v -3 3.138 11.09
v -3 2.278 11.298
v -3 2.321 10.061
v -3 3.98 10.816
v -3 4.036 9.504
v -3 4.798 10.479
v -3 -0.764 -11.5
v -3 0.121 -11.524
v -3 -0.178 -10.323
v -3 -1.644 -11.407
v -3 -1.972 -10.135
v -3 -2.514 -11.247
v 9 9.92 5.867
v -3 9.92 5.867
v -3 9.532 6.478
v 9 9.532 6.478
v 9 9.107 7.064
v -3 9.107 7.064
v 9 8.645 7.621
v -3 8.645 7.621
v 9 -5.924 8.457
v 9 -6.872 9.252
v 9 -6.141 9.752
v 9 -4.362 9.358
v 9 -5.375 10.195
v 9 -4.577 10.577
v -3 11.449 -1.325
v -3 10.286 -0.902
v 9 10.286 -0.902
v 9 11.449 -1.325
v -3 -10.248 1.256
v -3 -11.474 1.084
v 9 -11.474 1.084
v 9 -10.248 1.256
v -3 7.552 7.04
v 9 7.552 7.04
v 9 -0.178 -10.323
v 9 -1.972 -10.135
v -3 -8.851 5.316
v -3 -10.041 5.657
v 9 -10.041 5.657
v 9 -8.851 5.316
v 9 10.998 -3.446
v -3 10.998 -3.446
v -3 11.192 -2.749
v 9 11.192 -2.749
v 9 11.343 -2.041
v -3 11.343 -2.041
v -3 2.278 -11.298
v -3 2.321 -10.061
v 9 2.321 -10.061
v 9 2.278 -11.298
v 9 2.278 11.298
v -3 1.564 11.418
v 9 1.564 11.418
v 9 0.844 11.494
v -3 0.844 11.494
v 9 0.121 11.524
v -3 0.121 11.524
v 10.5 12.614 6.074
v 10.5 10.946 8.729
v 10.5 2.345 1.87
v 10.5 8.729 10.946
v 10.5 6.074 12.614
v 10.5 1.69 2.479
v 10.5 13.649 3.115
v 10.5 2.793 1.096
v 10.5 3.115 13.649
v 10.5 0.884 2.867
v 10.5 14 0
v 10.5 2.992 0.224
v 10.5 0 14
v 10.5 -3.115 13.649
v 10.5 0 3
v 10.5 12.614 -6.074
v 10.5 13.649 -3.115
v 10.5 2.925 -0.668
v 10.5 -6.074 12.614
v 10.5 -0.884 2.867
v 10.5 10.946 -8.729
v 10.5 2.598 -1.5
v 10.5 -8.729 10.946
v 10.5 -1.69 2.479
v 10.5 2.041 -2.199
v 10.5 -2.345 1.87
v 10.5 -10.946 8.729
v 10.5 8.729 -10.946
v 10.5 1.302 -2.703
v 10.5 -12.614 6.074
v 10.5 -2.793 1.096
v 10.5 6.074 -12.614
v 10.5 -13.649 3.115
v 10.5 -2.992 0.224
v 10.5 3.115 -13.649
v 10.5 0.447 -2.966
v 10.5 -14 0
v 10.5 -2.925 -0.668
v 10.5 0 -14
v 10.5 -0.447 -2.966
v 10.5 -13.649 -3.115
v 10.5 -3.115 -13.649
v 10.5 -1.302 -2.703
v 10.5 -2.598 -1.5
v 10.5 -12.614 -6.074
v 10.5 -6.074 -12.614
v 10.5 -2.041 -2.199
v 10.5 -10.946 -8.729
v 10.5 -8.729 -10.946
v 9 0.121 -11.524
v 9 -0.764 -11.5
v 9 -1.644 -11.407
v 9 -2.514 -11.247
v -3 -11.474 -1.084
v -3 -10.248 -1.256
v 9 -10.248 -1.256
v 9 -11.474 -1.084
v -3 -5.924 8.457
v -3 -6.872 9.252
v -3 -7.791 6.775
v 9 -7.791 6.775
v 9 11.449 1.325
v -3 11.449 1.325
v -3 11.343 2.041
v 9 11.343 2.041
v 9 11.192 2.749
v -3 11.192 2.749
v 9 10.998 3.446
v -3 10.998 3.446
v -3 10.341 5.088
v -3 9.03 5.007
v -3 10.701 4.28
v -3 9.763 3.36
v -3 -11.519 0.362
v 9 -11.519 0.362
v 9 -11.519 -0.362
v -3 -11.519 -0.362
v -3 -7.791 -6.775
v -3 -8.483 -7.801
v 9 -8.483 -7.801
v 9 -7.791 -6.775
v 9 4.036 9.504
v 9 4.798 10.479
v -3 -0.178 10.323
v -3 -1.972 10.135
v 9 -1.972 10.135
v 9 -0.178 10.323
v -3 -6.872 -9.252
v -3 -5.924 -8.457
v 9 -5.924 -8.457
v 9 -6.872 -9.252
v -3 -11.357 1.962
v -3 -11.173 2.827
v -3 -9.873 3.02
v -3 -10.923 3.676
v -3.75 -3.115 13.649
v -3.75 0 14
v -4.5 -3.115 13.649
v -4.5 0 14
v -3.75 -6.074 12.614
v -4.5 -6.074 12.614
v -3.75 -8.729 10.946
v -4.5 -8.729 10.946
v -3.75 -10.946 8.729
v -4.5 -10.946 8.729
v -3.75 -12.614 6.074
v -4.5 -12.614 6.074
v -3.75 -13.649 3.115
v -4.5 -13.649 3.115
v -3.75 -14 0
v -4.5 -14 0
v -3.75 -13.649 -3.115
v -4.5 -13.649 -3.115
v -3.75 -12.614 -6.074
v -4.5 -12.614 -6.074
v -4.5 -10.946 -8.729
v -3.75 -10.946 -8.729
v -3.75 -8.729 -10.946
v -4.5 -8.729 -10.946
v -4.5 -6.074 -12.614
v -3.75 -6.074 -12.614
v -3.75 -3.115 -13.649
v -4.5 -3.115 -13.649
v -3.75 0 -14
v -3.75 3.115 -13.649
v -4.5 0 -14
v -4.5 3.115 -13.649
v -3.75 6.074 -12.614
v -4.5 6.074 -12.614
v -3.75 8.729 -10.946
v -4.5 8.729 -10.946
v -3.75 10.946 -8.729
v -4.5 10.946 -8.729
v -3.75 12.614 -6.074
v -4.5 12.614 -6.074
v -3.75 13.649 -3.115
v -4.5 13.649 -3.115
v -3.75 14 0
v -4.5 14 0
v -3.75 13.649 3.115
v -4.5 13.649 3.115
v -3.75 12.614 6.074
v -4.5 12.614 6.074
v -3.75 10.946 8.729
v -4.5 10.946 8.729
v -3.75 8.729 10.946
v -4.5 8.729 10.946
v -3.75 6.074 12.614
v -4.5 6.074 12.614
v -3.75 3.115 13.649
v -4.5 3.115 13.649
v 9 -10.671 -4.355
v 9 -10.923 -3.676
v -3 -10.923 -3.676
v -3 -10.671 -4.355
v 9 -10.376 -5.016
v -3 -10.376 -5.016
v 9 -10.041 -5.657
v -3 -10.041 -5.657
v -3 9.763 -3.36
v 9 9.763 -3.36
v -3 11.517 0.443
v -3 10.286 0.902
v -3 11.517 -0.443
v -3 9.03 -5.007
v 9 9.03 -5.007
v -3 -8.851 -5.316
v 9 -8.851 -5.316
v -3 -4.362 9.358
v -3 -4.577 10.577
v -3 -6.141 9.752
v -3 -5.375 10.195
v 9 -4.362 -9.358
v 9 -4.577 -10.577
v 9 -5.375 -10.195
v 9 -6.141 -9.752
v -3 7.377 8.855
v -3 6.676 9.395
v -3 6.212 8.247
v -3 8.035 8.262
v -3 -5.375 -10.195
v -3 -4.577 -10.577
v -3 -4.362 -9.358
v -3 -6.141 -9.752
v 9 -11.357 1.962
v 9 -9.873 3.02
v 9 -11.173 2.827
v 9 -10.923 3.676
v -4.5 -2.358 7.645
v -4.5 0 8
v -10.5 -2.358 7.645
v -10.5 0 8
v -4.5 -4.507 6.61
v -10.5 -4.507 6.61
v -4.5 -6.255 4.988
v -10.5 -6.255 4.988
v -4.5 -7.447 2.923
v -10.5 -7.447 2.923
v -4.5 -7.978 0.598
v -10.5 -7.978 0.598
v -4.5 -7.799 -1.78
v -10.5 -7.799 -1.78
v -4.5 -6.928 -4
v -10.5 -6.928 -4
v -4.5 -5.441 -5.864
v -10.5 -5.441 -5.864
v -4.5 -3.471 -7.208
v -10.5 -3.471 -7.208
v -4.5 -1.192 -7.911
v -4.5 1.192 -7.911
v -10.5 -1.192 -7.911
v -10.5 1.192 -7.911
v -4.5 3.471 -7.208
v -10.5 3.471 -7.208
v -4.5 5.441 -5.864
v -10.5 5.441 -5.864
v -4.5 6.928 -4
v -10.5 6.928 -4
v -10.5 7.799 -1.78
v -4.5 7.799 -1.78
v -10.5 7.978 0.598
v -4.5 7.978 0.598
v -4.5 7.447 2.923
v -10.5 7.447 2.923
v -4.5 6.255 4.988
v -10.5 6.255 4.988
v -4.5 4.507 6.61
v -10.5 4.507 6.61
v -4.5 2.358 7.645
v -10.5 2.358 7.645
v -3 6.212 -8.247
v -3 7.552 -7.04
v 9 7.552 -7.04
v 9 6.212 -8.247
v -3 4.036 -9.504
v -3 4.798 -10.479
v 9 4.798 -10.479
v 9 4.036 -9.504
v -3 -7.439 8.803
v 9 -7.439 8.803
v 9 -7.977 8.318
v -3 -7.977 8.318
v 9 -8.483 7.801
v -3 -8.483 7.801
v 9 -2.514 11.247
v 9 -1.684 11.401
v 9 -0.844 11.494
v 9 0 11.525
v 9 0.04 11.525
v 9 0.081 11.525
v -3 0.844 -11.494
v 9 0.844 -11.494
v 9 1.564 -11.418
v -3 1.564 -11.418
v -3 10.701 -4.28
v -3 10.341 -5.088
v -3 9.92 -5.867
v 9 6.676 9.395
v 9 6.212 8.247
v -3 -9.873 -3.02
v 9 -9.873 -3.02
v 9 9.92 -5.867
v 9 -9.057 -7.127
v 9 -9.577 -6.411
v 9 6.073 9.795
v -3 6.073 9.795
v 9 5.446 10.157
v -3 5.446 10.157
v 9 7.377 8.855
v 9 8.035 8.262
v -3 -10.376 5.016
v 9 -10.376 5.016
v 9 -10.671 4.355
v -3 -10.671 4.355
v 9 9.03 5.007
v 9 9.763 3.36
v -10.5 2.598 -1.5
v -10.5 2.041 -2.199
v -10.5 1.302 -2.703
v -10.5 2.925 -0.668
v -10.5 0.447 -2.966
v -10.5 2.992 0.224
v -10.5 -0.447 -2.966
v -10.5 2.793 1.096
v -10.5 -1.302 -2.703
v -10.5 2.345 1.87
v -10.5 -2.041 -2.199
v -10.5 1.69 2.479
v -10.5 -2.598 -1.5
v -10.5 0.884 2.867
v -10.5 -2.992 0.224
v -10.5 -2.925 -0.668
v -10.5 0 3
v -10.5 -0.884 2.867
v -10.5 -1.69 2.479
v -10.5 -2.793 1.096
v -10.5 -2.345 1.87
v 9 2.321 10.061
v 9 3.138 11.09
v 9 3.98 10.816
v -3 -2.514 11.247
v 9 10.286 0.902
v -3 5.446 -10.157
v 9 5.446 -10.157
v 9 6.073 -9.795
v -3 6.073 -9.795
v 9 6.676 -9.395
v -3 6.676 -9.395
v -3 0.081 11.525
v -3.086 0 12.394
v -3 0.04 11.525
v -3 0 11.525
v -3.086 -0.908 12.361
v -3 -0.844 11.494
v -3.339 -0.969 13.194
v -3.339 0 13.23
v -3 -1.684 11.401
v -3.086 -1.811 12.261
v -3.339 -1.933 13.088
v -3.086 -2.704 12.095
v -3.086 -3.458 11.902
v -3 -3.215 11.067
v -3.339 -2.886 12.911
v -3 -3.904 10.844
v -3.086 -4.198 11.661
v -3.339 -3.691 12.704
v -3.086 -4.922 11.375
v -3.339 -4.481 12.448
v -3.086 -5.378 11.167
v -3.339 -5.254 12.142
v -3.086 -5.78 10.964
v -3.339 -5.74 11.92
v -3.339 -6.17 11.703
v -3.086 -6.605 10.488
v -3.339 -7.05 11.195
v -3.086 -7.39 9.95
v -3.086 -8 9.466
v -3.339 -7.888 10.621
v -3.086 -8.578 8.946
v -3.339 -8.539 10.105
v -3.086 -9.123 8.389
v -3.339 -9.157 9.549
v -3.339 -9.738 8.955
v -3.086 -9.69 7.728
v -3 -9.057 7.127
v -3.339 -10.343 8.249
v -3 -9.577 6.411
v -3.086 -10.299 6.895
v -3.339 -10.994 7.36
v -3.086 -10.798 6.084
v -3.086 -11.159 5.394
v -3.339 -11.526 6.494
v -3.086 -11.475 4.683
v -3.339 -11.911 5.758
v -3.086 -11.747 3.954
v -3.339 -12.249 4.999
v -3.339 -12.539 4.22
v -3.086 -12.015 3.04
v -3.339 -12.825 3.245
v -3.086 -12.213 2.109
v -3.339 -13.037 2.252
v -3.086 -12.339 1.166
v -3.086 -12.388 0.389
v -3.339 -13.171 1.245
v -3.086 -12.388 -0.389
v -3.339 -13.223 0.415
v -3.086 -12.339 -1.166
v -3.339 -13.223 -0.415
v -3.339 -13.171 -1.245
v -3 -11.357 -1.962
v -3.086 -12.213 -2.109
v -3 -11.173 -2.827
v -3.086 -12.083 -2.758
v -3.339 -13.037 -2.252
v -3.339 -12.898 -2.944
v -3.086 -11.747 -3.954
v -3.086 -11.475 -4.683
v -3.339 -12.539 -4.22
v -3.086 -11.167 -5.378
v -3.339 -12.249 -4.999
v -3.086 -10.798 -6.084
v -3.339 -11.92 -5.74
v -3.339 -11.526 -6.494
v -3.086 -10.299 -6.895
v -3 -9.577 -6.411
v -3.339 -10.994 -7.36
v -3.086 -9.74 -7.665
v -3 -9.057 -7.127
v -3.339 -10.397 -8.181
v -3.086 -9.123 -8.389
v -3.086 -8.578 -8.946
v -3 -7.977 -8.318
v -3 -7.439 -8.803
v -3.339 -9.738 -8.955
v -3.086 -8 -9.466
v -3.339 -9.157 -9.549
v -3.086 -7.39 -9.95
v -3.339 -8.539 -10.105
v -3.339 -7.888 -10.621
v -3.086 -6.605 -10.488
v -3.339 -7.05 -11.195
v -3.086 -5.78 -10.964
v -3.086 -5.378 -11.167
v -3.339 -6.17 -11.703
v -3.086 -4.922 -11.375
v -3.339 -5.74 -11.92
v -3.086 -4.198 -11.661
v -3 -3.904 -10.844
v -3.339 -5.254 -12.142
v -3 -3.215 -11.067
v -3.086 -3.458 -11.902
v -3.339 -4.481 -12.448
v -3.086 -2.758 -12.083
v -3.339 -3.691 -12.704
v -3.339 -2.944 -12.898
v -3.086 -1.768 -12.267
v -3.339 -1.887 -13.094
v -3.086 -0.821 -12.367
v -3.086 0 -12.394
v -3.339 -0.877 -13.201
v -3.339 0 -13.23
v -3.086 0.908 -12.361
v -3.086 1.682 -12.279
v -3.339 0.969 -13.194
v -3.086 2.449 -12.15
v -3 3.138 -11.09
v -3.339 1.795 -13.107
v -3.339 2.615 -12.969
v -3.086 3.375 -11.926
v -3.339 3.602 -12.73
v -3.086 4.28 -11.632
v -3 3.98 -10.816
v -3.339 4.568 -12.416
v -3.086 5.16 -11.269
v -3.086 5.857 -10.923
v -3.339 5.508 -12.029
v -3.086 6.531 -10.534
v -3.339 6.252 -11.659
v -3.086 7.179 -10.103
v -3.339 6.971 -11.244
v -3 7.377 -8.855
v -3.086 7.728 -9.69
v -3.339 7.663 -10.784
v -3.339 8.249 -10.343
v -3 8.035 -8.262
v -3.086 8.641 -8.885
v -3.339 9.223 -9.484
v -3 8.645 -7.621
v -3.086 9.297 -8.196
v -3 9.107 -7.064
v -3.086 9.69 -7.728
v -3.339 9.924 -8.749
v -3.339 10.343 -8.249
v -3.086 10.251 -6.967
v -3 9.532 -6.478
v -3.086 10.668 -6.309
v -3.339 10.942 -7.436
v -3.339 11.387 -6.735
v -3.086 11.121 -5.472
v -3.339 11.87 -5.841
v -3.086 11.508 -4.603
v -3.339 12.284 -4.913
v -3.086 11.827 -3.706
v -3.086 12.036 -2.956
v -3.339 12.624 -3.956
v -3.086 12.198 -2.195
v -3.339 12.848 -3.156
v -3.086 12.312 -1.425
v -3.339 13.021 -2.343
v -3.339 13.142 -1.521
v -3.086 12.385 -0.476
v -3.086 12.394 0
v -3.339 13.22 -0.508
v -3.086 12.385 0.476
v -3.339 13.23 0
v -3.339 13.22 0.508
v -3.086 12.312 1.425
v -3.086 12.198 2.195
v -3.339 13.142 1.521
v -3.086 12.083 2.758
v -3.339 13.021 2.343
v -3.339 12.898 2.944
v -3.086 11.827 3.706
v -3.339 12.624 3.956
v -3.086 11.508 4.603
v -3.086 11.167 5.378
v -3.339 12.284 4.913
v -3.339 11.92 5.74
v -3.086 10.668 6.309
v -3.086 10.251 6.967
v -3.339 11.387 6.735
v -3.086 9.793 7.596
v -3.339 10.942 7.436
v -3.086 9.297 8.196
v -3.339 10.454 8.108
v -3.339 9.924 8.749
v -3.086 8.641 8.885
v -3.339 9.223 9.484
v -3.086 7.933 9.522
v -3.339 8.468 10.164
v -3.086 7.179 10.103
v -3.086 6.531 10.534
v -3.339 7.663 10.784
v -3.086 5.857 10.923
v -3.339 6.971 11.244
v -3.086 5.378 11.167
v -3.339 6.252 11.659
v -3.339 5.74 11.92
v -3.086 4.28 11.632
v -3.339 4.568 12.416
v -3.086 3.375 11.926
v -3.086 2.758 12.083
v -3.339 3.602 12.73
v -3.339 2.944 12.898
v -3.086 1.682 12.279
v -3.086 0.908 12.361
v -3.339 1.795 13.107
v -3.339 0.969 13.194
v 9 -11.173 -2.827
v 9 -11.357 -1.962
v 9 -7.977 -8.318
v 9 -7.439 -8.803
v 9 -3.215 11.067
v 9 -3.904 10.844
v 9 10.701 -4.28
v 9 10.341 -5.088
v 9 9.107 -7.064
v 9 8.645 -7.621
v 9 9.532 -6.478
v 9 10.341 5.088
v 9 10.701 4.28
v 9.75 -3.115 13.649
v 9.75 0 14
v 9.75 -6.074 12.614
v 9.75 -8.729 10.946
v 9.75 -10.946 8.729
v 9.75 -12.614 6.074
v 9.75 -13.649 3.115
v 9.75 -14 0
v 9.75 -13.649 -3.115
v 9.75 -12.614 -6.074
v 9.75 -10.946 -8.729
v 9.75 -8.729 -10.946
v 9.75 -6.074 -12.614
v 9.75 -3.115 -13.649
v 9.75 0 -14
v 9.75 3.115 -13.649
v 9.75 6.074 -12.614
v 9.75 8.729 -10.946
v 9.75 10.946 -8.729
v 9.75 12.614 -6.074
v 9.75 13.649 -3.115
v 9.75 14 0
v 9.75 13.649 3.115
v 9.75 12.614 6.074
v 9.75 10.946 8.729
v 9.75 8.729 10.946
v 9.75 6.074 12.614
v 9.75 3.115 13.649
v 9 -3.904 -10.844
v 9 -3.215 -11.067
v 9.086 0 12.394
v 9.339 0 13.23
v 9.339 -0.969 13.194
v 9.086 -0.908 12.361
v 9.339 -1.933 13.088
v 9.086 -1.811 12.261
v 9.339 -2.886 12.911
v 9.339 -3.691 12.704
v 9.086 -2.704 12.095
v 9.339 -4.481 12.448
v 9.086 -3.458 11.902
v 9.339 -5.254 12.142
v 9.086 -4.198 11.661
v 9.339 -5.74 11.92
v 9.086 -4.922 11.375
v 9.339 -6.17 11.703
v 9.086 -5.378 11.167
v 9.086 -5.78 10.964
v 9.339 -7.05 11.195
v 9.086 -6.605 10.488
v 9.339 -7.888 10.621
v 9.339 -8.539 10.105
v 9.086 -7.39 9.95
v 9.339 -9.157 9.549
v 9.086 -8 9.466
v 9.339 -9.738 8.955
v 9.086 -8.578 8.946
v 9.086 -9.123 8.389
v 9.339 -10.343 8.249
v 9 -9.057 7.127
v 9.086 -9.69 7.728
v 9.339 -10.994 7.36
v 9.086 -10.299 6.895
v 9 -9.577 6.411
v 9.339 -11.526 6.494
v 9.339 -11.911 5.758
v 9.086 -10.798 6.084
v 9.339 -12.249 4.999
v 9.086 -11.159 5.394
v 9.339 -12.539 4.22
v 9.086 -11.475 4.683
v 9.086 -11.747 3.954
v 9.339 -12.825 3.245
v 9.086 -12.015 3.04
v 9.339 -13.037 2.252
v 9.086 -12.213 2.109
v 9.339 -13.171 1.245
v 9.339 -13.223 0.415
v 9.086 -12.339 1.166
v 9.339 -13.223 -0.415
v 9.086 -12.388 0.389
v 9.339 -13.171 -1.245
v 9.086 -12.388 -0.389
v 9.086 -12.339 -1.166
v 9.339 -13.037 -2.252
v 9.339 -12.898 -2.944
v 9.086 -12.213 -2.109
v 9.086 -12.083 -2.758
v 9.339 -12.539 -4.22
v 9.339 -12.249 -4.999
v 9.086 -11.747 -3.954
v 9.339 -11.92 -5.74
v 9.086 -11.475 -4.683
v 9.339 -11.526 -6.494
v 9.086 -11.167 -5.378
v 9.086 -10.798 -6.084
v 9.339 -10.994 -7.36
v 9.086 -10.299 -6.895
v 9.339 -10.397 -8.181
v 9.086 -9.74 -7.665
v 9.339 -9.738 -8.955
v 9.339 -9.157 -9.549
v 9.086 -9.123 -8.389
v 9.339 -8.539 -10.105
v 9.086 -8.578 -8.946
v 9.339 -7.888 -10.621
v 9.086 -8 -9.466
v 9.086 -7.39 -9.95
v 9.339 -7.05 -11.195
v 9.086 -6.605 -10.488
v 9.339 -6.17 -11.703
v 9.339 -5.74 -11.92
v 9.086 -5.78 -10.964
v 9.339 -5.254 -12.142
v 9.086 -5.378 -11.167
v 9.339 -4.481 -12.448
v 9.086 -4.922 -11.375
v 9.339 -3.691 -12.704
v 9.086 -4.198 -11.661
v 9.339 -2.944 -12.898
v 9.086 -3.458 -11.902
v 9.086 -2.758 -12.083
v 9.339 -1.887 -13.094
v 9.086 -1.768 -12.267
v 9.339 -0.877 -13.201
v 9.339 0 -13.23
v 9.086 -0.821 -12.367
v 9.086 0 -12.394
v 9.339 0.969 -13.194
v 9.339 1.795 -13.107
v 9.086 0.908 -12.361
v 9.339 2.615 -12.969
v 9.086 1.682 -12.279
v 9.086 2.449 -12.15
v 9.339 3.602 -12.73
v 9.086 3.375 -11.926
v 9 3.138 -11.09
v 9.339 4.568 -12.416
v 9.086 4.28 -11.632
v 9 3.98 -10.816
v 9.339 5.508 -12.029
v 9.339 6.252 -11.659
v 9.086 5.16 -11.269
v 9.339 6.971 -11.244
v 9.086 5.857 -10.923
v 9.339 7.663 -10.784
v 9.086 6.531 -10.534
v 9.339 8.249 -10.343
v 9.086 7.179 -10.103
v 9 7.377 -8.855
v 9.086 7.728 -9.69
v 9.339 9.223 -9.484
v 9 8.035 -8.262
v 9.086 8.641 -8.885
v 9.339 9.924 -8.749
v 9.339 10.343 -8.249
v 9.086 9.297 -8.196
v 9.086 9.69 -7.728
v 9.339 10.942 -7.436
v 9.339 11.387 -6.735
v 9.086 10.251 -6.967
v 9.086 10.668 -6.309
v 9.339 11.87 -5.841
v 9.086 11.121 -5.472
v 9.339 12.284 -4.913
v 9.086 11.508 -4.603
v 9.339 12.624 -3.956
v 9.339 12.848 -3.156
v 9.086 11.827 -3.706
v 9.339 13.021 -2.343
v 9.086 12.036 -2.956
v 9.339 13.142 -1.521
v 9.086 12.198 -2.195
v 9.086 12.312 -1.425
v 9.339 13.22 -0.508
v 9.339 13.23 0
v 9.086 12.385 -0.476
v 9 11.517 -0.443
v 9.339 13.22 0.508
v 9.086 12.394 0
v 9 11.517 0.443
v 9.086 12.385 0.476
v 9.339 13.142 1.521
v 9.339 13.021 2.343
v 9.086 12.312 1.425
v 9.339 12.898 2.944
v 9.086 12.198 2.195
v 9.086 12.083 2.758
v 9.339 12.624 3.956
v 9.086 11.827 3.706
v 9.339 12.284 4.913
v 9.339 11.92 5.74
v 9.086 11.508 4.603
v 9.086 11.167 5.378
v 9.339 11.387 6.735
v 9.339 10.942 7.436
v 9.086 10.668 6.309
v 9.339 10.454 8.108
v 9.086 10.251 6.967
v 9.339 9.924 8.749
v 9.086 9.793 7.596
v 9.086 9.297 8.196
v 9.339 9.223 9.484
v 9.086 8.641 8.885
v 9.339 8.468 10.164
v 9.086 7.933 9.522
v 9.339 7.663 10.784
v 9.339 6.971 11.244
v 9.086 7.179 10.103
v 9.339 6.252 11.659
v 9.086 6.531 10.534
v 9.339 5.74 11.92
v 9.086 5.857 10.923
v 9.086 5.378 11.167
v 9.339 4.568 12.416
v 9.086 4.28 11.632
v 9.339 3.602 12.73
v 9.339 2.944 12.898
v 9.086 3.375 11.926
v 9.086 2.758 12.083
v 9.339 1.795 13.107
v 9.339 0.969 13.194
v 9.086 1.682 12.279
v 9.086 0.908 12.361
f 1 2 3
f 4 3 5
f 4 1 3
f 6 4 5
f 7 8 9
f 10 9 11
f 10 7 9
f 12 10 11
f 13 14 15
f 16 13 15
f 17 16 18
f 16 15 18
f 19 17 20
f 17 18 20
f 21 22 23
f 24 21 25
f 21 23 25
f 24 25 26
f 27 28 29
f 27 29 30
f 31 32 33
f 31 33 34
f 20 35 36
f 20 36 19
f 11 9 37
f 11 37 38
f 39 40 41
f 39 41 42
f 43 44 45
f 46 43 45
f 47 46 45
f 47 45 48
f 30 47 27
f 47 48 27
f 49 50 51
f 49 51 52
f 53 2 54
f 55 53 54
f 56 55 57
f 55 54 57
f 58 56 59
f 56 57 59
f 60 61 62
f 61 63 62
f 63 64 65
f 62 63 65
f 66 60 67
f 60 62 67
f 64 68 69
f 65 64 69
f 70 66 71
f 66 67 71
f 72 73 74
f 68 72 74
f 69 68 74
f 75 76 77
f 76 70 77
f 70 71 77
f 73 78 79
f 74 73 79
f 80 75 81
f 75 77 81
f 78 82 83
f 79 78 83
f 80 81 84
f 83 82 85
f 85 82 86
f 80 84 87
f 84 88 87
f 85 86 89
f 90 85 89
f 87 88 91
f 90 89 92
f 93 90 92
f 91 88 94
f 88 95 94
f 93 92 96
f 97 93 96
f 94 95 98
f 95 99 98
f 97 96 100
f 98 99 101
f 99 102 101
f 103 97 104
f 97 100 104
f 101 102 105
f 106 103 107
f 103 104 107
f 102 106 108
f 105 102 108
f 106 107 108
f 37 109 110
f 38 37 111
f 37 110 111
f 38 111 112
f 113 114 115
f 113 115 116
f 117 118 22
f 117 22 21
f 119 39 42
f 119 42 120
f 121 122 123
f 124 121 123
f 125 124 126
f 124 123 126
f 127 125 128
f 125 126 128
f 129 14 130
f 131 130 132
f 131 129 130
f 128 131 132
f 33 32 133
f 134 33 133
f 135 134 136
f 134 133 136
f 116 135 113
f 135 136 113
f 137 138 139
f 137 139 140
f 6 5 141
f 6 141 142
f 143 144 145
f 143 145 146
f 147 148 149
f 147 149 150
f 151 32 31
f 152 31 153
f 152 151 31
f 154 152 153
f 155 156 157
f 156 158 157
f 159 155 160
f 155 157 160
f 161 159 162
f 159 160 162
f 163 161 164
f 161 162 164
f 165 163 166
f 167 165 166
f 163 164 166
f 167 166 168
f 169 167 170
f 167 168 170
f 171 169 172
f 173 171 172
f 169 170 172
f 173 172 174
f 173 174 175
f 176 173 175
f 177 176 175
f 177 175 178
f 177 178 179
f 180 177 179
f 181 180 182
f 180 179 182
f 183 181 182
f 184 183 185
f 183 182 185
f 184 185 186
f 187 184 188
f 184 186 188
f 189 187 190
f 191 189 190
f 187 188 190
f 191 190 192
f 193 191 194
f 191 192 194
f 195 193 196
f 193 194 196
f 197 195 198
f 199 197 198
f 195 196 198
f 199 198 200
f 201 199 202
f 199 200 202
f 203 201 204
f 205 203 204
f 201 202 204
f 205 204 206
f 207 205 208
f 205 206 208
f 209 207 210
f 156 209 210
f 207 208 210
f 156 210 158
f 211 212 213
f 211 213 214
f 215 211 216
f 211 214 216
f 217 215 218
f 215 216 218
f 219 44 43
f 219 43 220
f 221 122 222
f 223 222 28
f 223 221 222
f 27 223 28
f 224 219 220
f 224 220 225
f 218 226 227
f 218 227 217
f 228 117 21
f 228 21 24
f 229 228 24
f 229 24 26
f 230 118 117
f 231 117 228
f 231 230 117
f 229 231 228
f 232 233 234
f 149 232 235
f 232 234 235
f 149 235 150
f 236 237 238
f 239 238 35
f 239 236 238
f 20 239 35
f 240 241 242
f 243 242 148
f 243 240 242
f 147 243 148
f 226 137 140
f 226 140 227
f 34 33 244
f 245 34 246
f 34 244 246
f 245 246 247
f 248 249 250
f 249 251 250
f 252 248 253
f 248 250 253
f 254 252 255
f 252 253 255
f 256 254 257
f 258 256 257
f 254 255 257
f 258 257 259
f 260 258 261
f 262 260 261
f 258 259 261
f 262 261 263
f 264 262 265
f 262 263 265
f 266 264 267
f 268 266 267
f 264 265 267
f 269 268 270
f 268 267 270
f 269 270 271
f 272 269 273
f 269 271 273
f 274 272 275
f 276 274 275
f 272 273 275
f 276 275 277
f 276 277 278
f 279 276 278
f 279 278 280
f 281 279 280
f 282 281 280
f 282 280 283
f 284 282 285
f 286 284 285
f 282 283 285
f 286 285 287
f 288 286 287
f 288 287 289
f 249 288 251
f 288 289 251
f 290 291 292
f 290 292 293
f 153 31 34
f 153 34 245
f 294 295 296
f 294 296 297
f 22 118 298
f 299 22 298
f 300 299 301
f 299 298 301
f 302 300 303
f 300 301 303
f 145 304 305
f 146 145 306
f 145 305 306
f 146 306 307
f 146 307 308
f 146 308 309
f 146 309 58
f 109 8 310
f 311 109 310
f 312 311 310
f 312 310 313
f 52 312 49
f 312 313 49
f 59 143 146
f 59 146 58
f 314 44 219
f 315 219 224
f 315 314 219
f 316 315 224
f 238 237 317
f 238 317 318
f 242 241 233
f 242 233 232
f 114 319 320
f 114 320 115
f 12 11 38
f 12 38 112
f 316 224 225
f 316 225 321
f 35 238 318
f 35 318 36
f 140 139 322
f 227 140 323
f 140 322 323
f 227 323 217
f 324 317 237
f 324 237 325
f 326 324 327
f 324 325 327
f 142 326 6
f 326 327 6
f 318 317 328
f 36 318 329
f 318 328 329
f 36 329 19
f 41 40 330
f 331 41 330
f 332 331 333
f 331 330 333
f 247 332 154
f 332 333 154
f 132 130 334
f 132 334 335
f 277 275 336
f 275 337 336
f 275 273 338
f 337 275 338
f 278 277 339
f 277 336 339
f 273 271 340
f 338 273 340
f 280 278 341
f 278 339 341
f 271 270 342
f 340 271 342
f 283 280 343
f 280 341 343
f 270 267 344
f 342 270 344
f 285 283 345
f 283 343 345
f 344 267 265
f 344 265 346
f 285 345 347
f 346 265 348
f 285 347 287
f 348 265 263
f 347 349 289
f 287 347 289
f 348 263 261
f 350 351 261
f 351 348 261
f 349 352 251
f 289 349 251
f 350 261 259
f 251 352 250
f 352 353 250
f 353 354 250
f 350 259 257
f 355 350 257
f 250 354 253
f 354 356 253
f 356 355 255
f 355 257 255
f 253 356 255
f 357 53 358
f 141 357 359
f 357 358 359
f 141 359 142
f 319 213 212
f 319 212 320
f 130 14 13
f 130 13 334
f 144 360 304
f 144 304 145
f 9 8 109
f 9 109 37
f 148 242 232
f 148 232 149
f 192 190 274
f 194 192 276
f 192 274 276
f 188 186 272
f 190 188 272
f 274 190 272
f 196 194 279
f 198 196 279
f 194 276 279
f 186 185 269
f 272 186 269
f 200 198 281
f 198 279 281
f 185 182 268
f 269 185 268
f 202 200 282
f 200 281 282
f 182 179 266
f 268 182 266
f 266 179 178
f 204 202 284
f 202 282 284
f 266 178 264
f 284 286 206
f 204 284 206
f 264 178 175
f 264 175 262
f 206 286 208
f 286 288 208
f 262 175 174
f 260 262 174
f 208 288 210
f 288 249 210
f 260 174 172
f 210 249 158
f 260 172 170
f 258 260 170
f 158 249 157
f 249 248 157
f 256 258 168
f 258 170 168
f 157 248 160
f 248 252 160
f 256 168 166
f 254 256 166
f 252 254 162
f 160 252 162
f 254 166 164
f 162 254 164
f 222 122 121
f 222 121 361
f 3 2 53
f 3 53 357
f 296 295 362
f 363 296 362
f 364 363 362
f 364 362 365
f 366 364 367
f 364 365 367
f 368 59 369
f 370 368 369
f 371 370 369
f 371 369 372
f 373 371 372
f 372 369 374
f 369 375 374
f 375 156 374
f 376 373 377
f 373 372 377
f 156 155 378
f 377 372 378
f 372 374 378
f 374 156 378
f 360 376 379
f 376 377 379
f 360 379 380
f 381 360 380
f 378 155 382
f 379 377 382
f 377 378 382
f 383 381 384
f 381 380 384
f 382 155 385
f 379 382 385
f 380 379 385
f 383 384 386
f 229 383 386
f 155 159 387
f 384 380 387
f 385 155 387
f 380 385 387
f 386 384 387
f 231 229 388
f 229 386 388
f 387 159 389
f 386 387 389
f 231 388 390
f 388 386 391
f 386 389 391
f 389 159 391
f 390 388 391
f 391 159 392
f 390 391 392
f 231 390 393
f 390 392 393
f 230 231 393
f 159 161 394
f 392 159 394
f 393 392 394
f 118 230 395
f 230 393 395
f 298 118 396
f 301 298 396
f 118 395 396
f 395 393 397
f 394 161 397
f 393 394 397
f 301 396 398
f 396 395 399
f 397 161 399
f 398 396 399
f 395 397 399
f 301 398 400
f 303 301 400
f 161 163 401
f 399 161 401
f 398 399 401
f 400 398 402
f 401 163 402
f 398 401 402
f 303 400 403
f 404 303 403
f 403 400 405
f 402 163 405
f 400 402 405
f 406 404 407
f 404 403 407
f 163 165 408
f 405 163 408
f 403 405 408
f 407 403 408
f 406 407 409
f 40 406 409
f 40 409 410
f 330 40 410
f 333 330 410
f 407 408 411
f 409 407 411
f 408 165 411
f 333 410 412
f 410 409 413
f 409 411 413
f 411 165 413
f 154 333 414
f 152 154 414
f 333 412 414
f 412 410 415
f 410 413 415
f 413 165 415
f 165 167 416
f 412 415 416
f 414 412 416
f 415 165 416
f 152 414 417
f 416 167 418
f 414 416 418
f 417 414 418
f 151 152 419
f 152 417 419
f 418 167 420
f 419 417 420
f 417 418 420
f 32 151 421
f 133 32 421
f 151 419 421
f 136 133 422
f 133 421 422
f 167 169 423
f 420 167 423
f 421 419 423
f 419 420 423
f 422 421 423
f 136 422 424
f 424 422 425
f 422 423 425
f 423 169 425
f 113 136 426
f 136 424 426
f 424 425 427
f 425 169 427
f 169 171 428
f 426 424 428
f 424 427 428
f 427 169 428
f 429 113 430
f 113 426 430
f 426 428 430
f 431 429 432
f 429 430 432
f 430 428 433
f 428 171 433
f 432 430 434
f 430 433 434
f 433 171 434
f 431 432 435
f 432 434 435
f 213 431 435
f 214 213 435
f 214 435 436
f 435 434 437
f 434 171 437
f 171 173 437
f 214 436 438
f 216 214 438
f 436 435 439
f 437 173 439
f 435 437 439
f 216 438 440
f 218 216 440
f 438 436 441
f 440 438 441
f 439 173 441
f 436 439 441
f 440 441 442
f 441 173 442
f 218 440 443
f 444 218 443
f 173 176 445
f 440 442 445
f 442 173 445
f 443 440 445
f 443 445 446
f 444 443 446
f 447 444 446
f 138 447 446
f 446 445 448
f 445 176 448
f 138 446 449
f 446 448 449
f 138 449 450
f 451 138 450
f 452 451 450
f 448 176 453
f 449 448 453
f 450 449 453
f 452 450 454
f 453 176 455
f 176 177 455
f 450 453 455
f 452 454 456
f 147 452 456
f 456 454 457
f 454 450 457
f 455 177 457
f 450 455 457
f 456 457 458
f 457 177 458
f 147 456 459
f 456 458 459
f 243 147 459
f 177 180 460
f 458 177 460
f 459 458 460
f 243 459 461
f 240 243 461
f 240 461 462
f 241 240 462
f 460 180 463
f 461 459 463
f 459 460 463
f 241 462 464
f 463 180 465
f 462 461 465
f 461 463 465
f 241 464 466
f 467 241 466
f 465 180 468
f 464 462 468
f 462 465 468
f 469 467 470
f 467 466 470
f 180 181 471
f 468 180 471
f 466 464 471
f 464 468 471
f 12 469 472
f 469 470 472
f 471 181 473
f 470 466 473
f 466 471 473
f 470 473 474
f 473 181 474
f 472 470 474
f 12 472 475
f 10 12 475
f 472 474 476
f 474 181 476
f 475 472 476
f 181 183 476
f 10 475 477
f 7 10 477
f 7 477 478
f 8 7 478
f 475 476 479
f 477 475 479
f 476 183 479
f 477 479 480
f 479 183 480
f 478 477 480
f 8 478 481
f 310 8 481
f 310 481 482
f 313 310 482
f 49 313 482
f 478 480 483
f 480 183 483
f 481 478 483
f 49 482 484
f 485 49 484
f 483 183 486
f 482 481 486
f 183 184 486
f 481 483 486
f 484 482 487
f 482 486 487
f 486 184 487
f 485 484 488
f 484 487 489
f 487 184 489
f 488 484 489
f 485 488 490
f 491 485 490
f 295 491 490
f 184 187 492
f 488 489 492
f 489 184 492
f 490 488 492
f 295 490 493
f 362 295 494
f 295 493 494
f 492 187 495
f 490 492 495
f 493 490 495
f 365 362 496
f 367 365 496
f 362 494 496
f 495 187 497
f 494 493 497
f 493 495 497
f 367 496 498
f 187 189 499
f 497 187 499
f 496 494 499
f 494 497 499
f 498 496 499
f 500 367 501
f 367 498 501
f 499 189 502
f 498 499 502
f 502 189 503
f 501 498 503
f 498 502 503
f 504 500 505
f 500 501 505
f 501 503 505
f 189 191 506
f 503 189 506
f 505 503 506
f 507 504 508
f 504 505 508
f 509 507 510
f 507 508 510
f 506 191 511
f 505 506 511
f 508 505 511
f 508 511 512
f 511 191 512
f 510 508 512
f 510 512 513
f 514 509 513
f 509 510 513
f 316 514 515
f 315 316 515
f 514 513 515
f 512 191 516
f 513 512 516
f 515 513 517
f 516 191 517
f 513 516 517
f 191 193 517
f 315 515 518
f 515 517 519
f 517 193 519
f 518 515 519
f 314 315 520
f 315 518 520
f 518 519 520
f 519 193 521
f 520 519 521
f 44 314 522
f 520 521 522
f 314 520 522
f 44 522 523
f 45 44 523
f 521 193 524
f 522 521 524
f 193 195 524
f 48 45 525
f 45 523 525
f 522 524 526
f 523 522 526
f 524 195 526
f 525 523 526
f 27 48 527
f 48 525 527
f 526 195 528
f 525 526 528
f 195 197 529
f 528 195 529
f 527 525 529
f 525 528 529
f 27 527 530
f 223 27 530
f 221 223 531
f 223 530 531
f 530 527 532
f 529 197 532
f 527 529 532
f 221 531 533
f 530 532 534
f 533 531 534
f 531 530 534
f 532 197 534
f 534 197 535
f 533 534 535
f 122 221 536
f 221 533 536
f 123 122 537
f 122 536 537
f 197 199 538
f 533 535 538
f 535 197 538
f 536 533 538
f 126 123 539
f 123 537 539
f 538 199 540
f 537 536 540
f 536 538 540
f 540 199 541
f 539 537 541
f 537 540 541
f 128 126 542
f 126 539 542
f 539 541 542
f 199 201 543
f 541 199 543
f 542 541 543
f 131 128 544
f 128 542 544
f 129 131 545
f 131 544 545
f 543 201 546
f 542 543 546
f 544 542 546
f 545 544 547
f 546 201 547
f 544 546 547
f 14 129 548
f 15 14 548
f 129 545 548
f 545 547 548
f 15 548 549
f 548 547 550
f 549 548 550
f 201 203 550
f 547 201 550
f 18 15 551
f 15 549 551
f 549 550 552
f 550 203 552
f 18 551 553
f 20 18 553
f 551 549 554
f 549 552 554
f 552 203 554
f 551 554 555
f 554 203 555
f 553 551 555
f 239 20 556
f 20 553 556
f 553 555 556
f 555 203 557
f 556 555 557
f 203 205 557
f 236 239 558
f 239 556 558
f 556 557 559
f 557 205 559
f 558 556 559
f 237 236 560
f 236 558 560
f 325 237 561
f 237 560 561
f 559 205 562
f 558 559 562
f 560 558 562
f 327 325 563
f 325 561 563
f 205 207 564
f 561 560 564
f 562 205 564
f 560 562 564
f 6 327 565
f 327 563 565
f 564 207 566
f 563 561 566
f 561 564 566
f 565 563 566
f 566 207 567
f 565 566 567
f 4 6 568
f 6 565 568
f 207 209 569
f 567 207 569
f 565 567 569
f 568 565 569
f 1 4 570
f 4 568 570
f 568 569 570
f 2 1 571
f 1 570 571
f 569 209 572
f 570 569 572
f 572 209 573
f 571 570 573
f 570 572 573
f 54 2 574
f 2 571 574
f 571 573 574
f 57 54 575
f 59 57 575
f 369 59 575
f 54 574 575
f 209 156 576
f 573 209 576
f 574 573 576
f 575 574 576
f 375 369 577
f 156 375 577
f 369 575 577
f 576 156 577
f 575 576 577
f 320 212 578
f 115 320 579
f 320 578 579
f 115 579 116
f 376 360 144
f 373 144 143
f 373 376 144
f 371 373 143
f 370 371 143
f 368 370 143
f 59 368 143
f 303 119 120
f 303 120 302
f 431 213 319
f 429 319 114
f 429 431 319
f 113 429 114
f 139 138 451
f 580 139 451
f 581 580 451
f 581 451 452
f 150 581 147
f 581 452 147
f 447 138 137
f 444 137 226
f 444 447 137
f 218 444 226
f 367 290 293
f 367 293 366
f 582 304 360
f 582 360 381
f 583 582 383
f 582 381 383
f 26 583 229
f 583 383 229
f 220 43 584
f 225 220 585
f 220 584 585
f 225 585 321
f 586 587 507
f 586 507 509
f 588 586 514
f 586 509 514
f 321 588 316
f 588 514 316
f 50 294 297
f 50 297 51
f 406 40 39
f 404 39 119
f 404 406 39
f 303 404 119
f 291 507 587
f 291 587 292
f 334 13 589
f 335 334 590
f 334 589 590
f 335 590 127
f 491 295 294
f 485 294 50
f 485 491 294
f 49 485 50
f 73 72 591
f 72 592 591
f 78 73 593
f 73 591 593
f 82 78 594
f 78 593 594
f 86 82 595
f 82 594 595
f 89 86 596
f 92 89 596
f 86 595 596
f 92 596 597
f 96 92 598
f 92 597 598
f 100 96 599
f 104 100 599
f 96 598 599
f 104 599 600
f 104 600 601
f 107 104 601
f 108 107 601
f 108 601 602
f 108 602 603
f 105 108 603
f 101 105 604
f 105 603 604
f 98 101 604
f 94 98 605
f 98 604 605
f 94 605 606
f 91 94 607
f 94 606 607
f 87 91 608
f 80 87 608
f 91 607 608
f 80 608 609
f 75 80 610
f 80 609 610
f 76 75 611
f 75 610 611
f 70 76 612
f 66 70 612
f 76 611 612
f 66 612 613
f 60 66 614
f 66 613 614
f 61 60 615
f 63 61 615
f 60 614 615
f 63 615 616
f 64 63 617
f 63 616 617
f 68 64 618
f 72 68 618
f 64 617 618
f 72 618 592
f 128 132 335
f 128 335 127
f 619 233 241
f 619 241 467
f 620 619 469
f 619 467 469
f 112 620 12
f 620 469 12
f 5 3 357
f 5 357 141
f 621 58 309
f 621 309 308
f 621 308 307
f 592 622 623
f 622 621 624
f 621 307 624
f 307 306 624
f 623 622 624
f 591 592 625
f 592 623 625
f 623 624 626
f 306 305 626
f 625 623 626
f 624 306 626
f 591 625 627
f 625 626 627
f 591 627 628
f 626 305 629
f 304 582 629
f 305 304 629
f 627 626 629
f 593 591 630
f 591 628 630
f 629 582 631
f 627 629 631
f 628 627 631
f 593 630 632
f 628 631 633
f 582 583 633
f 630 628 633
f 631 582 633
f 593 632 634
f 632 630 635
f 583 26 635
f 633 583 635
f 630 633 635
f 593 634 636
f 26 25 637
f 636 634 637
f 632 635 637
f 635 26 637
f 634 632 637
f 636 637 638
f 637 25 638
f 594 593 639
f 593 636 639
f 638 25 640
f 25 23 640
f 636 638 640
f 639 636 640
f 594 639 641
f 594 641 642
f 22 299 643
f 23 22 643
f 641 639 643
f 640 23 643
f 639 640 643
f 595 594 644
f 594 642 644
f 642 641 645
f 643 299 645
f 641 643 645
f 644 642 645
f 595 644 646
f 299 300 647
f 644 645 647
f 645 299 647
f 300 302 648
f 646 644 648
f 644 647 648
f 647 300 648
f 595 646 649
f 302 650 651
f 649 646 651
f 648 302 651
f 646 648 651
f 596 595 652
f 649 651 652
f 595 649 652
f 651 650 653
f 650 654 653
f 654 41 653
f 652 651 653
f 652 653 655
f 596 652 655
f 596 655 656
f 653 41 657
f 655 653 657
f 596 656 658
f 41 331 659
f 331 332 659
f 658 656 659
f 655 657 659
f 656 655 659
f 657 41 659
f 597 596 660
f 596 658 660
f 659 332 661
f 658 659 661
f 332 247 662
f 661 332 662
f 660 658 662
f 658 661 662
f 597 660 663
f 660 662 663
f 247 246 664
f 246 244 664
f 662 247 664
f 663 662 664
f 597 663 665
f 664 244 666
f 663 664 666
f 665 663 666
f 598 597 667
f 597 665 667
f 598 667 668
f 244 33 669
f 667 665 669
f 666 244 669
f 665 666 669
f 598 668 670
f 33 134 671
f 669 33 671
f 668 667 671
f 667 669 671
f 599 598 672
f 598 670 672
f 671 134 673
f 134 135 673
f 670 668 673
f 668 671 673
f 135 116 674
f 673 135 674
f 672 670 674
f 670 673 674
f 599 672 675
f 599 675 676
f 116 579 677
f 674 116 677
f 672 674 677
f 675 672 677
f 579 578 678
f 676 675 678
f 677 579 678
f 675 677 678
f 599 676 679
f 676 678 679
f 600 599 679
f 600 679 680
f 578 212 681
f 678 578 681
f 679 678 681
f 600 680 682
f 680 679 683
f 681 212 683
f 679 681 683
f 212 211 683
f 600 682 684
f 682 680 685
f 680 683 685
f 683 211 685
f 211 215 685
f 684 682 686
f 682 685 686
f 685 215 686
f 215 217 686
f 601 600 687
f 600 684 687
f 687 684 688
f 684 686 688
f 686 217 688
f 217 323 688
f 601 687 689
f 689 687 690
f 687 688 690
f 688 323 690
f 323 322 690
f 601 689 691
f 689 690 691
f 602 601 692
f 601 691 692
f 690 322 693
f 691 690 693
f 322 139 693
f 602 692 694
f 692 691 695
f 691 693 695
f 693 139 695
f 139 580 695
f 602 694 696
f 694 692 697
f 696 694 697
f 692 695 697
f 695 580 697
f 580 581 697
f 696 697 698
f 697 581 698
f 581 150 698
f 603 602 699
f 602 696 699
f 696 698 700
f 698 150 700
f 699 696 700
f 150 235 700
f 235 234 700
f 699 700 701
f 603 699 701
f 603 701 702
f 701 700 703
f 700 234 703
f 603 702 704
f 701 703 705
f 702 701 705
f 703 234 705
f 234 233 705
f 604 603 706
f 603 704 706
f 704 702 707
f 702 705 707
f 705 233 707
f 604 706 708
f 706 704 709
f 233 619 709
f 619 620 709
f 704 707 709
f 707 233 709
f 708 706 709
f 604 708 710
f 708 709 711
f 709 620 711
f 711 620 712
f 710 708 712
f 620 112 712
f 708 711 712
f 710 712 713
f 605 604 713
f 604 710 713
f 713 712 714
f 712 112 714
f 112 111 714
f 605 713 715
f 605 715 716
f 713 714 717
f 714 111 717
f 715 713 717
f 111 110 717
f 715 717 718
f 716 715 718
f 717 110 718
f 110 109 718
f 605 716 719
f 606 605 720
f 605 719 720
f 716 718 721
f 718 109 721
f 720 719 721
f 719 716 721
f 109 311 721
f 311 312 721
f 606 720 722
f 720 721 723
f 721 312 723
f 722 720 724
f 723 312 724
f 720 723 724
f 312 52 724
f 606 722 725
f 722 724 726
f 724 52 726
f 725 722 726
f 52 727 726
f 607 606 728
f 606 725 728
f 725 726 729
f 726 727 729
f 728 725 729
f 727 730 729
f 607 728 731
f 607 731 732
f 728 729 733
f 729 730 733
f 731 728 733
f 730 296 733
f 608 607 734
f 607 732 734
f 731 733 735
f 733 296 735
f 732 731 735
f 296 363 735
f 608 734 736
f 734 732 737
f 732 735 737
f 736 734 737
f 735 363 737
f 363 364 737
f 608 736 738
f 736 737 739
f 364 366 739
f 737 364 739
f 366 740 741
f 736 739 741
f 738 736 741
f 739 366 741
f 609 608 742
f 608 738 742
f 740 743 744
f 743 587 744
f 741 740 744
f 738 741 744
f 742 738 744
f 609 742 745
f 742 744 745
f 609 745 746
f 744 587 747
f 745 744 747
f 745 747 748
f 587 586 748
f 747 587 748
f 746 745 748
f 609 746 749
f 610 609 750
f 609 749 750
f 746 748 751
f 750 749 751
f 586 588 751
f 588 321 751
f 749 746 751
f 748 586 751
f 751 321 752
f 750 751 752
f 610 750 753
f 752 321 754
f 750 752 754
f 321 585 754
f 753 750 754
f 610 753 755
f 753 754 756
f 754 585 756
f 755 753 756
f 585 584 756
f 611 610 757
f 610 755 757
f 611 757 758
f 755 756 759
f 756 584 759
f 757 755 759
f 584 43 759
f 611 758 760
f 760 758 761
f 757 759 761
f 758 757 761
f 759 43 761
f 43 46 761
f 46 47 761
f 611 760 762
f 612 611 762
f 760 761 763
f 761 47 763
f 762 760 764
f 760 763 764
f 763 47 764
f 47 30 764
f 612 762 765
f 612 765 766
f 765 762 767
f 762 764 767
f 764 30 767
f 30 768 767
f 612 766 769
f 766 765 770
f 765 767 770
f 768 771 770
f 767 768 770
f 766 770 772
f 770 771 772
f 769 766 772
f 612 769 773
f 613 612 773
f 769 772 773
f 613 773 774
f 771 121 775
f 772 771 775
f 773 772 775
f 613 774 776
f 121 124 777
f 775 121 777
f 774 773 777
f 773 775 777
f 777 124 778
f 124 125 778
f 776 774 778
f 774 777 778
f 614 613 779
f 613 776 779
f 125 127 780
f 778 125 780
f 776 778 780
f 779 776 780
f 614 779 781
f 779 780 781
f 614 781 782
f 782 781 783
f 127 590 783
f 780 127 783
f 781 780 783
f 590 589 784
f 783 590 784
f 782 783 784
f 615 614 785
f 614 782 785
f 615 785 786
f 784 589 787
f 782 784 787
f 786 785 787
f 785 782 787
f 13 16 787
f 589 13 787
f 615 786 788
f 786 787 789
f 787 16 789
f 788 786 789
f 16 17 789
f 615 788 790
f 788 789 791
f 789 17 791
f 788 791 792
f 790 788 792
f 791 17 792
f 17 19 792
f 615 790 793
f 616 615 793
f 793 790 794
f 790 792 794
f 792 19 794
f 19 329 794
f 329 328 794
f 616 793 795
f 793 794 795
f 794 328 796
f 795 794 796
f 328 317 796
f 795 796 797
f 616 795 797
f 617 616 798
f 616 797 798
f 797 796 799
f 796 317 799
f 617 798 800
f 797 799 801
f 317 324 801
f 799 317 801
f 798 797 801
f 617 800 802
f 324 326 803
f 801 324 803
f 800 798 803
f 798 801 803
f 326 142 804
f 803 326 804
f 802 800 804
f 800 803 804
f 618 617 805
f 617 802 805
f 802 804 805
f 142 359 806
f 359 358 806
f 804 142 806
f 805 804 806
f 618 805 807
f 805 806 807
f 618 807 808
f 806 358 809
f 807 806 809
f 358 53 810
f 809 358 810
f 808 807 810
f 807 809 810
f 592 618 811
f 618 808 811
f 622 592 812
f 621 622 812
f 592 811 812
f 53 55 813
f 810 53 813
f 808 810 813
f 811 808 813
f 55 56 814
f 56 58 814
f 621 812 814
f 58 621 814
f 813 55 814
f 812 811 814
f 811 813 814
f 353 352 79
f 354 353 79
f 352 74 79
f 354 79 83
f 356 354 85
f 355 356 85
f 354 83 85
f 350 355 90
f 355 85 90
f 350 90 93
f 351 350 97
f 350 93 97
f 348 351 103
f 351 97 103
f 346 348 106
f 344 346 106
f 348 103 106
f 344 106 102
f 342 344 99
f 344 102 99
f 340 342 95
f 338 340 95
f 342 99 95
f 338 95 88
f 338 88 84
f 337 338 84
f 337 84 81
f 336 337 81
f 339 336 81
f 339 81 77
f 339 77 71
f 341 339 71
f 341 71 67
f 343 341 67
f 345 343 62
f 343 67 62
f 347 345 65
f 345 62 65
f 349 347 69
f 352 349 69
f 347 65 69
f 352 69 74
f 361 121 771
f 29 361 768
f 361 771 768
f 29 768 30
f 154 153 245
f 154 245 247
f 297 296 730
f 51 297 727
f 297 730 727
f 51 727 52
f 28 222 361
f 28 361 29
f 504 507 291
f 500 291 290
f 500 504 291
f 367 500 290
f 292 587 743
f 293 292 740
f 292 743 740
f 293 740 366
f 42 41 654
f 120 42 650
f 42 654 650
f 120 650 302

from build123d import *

# Parameters (mm, degrees)
CUT_EXTRUDE1_START = -3
CUT_EXTRUDE1_DEPTH = 12
CIRPATTERN1_COUNT  = 15


with BuildPart() as part:
    # Sketch1 → Revolve1 (revolve)
    with BuildSketch(Plane.XY, mode=Mode.PRIVATE) as revolve1_sk:
        with BuildLine():
            Line((-10.5, 3), (10.5, 3))
            Line((10.5, 3), (10.5, 14))
            Line((10.5, 14), (9.75, 14))
            ThreePointArc((9.75, 14), (9.191617437, 12.818070474), (9, 11.525))
            Line((9, 11.525), (-3, 11.525))
            ThreePointArc((-3, 11.525), (-3.191617437, 12.818070474), (-3.75, 14))
            Line((-3.75, 14), (-4.5, 14))
            Line((-4.5, 14), (-4.5, 8))
            Line((-4.5, 8), (-10.5, 8))
            Line((-10.5, 8), (-10.5, 3))
        make_face()
    revolve(revolve1_sk.sketch.rotate(Axis((-10.5, 0, 0), (1, 0, 0)), 90), axis=Axis((-10.5, 0, 0), (1, 0, 0)))

    # Sketch3 → Cut-Extrude1 (cut)
    with BuildSketch(Plane(origin=(0, 0, 0), x_dir=(0, 0, -1), z_dir=(1, 0, 0)).offset(CUT_EXTRUDE1_START)):
        with BuildLine():
            Line((-1.325, 11.448580698), (-0.901692109, 10.285551825))
            Line((-0.901692109, 10.285551825), (0.901692109, 10.285551825))
            Line((0.901692109, 10.285551825), (1.325, 11.448580698))
            ThreePointArc((1.325, 11.448580698), (0, 11.525), (-1.325, 11.448580698))
        make_face()
    cut_extrude1 = extrude(amount=CUT_EXTRUDE1_DEPTH, mode=Mode.SUBTRACT)

    # CirPattern1: Cut-Extrude1 ×15 about axis
    cirpattern1_axis = Axis((0, 0, 0), (1, 0, 0))
    for i in range(1, CIRPATTERN1_COUNT):
        add(cut_extrude1.rotate(cirpattern1_axis, i * 360 / CIRPATTERN1_COUNT), mode=Mode.SUBTRACT)


solid = part.part
